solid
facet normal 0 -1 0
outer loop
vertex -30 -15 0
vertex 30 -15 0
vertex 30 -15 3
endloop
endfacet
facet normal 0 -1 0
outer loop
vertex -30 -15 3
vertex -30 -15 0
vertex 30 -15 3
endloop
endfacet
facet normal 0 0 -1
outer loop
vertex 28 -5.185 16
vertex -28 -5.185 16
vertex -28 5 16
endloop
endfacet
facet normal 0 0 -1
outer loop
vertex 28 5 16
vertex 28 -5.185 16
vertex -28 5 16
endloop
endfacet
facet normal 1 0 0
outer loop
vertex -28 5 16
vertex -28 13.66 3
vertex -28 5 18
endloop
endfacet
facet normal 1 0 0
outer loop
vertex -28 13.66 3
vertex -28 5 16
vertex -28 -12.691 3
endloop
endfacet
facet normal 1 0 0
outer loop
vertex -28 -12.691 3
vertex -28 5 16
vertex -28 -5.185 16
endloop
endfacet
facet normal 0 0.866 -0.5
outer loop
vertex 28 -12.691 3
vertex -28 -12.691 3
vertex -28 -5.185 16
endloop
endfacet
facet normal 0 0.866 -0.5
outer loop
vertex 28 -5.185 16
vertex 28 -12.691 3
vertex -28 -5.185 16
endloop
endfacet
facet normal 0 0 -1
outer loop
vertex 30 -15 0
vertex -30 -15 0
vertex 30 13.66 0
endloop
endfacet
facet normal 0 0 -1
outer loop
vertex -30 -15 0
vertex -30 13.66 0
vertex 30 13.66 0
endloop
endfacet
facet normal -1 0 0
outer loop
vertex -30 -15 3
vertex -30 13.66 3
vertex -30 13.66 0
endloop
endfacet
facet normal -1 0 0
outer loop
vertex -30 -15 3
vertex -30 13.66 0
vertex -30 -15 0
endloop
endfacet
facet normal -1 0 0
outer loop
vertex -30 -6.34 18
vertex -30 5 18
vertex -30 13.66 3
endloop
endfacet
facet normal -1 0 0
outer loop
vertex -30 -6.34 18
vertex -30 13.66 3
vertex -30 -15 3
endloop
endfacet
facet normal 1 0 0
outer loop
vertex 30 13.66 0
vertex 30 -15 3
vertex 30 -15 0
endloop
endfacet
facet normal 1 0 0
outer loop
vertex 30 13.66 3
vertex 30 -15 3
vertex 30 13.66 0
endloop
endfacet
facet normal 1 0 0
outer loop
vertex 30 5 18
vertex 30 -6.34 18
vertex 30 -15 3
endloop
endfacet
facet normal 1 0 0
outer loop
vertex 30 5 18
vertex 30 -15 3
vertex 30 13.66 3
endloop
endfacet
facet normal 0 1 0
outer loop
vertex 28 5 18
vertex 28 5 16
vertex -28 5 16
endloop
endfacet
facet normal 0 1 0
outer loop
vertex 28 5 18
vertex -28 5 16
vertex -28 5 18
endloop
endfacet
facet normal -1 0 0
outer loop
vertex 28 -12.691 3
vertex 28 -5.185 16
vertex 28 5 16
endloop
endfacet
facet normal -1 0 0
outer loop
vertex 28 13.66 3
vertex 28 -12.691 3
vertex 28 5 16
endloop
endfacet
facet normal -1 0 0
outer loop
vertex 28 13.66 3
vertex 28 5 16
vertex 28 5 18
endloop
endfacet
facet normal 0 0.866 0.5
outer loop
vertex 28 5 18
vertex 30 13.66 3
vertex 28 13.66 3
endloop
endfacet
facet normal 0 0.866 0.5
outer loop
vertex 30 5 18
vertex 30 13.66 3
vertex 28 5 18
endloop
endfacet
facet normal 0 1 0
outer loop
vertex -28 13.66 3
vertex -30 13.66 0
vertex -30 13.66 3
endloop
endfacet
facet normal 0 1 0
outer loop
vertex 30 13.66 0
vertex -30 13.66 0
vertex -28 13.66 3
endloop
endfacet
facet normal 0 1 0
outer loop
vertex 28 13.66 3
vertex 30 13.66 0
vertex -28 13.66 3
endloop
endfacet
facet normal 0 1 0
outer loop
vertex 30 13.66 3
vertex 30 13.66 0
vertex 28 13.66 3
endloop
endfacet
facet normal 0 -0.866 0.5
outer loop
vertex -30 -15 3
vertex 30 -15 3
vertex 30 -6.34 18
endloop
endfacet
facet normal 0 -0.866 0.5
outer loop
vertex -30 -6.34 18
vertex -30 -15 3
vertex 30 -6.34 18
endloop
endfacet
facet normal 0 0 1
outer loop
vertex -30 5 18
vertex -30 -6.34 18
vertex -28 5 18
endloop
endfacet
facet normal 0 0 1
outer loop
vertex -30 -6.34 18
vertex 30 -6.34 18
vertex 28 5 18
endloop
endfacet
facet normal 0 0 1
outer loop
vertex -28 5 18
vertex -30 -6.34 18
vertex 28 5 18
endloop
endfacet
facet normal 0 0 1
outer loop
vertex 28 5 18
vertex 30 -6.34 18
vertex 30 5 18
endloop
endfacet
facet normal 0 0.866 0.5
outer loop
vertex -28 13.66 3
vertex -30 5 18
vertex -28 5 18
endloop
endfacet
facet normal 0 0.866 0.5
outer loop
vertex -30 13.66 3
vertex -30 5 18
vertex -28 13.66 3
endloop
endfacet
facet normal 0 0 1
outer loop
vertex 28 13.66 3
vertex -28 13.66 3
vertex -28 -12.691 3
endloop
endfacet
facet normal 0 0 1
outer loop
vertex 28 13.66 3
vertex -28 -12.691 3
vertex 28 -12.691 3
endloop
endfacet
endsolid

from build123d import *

# Parameters (mm, degrees)
F0_W      = 60
F0_H      = 30
F1_DEPTH  = 3
F2_W      = 15
F2_H      = 15
F3_DEPTH  = 60
F4_W      = 5
F4_H      = 15
F5_DEPTH  = 60
F7_DEPTH  = 60
F9_DEPTH  = 58
F11_DEPTH = 2
F13_DEPTH = 2
F15_DEPTH = 2
F16_W     = 1.339746
F16_H     = 3
F17_DEPTH = 60


with BuildPart() as f1:
    # F0 (on Top) → F1 (new body)
    with BuildSketch(Plane.XY):
        Rectangle(F0_W, F0_H)
    extrude(amount=F1_DEPTH)

    # F2 (on face) → F3 (join)
    with BuildSketch(Plane.YZ.offset(30)):
        with Locations((-7.5, 10.5)):
            Rectangle(F2_W, F2_H)
    extrude(amount=-F3_DEPTH)

    # F4 (on face) → F5 (join)
    with BuildSketch(Plane.YZ.offset(30)):
        with Locations((2.5, 10.5)):
            Rectangle(F4_W, F4_H)
    extrude(amount=-F5_DEPTH)

    # F6 (on face) → F7 (cut, through all)
    with BuildSketch(Plane.YZ.offset(30)):
        Polygon((-15, 18), (-15, 3), (-6.339746, 18), align=None)
    extrude(amount=-F7_DEPTH, mode=Mode.SUBTRACT)

    # F8 (on face) → F9 (cut)
    with BuildSketch(Plane(origin=(-30, 0, 0), x_dir=(0, -1, 0), z_dir=(-1, 0, 0))):
        Polygon((-5, 16), (-5, 3), (12.690599, 3), (5.185045, 16), align=None)
    extrude(amount=-F9_DEPTH, mode=Mode.SUBTRACT)

    # F10 (on face) → F11 (join)
    with BuildSketch(Plane(origin=(-30, 0, 0), x_dir=(0, -1, 0), z_dir=(-1, 0, 0))):
        Polygon((6.339746, 18), (-5, 18), (-5, 16), (5.185045, 16), (12.690599, 3), (-5, 3), (-5, 0), (15, 0), (15, 3), align=None)
        Polygon((5.185045, 16), (-5, 16), (-5, 3), (12.690599, 3), align=None)
    extrude(amount=-F11_DEPTH)

    # F12 (on face) → F13 (join)
    with BuildSketch(Plane(origin=(-30, 0, 0), x_dir=(0, -1, 0), z_dir=(-1, 0, 0))):
        Polygon((-5, 3), (-5, 18), (-13.660254, 3), align=None)
        Polygon((6.339746, 18), (-5, 18), (-5, 3), (-13.660254, 3), (-15, 3), (-15, 0), (15, 0), (15, 3), align=None)
    extrude(amount=-F13_DEPTH)

    # F14 (on face) → F15 (join)
    with BuildSketch(Plane.YZ.offset(30)):
        Polygon((5, 3), (5, 18), (-6.339746, 18), (-15, 3), (-15, 0), (15, 0), (15, 3), (13.660254, 3), align=None)
        Polygon((13.660254, 3), (5, 18), (5, 3), align=None)
    extrude(amount=-F15_DEPTH)

    # F16 (on face) → F17 (cut)
    with BuildSketch(Plane.YZ.offset(30)):
        with Locations((14.330127, 1.5)):
            Rectangle(F16_W, F16_H)
    extrude(amount=-F17_DEPTH, mode=Mode.SUBTRACT)


solid = f1.part
